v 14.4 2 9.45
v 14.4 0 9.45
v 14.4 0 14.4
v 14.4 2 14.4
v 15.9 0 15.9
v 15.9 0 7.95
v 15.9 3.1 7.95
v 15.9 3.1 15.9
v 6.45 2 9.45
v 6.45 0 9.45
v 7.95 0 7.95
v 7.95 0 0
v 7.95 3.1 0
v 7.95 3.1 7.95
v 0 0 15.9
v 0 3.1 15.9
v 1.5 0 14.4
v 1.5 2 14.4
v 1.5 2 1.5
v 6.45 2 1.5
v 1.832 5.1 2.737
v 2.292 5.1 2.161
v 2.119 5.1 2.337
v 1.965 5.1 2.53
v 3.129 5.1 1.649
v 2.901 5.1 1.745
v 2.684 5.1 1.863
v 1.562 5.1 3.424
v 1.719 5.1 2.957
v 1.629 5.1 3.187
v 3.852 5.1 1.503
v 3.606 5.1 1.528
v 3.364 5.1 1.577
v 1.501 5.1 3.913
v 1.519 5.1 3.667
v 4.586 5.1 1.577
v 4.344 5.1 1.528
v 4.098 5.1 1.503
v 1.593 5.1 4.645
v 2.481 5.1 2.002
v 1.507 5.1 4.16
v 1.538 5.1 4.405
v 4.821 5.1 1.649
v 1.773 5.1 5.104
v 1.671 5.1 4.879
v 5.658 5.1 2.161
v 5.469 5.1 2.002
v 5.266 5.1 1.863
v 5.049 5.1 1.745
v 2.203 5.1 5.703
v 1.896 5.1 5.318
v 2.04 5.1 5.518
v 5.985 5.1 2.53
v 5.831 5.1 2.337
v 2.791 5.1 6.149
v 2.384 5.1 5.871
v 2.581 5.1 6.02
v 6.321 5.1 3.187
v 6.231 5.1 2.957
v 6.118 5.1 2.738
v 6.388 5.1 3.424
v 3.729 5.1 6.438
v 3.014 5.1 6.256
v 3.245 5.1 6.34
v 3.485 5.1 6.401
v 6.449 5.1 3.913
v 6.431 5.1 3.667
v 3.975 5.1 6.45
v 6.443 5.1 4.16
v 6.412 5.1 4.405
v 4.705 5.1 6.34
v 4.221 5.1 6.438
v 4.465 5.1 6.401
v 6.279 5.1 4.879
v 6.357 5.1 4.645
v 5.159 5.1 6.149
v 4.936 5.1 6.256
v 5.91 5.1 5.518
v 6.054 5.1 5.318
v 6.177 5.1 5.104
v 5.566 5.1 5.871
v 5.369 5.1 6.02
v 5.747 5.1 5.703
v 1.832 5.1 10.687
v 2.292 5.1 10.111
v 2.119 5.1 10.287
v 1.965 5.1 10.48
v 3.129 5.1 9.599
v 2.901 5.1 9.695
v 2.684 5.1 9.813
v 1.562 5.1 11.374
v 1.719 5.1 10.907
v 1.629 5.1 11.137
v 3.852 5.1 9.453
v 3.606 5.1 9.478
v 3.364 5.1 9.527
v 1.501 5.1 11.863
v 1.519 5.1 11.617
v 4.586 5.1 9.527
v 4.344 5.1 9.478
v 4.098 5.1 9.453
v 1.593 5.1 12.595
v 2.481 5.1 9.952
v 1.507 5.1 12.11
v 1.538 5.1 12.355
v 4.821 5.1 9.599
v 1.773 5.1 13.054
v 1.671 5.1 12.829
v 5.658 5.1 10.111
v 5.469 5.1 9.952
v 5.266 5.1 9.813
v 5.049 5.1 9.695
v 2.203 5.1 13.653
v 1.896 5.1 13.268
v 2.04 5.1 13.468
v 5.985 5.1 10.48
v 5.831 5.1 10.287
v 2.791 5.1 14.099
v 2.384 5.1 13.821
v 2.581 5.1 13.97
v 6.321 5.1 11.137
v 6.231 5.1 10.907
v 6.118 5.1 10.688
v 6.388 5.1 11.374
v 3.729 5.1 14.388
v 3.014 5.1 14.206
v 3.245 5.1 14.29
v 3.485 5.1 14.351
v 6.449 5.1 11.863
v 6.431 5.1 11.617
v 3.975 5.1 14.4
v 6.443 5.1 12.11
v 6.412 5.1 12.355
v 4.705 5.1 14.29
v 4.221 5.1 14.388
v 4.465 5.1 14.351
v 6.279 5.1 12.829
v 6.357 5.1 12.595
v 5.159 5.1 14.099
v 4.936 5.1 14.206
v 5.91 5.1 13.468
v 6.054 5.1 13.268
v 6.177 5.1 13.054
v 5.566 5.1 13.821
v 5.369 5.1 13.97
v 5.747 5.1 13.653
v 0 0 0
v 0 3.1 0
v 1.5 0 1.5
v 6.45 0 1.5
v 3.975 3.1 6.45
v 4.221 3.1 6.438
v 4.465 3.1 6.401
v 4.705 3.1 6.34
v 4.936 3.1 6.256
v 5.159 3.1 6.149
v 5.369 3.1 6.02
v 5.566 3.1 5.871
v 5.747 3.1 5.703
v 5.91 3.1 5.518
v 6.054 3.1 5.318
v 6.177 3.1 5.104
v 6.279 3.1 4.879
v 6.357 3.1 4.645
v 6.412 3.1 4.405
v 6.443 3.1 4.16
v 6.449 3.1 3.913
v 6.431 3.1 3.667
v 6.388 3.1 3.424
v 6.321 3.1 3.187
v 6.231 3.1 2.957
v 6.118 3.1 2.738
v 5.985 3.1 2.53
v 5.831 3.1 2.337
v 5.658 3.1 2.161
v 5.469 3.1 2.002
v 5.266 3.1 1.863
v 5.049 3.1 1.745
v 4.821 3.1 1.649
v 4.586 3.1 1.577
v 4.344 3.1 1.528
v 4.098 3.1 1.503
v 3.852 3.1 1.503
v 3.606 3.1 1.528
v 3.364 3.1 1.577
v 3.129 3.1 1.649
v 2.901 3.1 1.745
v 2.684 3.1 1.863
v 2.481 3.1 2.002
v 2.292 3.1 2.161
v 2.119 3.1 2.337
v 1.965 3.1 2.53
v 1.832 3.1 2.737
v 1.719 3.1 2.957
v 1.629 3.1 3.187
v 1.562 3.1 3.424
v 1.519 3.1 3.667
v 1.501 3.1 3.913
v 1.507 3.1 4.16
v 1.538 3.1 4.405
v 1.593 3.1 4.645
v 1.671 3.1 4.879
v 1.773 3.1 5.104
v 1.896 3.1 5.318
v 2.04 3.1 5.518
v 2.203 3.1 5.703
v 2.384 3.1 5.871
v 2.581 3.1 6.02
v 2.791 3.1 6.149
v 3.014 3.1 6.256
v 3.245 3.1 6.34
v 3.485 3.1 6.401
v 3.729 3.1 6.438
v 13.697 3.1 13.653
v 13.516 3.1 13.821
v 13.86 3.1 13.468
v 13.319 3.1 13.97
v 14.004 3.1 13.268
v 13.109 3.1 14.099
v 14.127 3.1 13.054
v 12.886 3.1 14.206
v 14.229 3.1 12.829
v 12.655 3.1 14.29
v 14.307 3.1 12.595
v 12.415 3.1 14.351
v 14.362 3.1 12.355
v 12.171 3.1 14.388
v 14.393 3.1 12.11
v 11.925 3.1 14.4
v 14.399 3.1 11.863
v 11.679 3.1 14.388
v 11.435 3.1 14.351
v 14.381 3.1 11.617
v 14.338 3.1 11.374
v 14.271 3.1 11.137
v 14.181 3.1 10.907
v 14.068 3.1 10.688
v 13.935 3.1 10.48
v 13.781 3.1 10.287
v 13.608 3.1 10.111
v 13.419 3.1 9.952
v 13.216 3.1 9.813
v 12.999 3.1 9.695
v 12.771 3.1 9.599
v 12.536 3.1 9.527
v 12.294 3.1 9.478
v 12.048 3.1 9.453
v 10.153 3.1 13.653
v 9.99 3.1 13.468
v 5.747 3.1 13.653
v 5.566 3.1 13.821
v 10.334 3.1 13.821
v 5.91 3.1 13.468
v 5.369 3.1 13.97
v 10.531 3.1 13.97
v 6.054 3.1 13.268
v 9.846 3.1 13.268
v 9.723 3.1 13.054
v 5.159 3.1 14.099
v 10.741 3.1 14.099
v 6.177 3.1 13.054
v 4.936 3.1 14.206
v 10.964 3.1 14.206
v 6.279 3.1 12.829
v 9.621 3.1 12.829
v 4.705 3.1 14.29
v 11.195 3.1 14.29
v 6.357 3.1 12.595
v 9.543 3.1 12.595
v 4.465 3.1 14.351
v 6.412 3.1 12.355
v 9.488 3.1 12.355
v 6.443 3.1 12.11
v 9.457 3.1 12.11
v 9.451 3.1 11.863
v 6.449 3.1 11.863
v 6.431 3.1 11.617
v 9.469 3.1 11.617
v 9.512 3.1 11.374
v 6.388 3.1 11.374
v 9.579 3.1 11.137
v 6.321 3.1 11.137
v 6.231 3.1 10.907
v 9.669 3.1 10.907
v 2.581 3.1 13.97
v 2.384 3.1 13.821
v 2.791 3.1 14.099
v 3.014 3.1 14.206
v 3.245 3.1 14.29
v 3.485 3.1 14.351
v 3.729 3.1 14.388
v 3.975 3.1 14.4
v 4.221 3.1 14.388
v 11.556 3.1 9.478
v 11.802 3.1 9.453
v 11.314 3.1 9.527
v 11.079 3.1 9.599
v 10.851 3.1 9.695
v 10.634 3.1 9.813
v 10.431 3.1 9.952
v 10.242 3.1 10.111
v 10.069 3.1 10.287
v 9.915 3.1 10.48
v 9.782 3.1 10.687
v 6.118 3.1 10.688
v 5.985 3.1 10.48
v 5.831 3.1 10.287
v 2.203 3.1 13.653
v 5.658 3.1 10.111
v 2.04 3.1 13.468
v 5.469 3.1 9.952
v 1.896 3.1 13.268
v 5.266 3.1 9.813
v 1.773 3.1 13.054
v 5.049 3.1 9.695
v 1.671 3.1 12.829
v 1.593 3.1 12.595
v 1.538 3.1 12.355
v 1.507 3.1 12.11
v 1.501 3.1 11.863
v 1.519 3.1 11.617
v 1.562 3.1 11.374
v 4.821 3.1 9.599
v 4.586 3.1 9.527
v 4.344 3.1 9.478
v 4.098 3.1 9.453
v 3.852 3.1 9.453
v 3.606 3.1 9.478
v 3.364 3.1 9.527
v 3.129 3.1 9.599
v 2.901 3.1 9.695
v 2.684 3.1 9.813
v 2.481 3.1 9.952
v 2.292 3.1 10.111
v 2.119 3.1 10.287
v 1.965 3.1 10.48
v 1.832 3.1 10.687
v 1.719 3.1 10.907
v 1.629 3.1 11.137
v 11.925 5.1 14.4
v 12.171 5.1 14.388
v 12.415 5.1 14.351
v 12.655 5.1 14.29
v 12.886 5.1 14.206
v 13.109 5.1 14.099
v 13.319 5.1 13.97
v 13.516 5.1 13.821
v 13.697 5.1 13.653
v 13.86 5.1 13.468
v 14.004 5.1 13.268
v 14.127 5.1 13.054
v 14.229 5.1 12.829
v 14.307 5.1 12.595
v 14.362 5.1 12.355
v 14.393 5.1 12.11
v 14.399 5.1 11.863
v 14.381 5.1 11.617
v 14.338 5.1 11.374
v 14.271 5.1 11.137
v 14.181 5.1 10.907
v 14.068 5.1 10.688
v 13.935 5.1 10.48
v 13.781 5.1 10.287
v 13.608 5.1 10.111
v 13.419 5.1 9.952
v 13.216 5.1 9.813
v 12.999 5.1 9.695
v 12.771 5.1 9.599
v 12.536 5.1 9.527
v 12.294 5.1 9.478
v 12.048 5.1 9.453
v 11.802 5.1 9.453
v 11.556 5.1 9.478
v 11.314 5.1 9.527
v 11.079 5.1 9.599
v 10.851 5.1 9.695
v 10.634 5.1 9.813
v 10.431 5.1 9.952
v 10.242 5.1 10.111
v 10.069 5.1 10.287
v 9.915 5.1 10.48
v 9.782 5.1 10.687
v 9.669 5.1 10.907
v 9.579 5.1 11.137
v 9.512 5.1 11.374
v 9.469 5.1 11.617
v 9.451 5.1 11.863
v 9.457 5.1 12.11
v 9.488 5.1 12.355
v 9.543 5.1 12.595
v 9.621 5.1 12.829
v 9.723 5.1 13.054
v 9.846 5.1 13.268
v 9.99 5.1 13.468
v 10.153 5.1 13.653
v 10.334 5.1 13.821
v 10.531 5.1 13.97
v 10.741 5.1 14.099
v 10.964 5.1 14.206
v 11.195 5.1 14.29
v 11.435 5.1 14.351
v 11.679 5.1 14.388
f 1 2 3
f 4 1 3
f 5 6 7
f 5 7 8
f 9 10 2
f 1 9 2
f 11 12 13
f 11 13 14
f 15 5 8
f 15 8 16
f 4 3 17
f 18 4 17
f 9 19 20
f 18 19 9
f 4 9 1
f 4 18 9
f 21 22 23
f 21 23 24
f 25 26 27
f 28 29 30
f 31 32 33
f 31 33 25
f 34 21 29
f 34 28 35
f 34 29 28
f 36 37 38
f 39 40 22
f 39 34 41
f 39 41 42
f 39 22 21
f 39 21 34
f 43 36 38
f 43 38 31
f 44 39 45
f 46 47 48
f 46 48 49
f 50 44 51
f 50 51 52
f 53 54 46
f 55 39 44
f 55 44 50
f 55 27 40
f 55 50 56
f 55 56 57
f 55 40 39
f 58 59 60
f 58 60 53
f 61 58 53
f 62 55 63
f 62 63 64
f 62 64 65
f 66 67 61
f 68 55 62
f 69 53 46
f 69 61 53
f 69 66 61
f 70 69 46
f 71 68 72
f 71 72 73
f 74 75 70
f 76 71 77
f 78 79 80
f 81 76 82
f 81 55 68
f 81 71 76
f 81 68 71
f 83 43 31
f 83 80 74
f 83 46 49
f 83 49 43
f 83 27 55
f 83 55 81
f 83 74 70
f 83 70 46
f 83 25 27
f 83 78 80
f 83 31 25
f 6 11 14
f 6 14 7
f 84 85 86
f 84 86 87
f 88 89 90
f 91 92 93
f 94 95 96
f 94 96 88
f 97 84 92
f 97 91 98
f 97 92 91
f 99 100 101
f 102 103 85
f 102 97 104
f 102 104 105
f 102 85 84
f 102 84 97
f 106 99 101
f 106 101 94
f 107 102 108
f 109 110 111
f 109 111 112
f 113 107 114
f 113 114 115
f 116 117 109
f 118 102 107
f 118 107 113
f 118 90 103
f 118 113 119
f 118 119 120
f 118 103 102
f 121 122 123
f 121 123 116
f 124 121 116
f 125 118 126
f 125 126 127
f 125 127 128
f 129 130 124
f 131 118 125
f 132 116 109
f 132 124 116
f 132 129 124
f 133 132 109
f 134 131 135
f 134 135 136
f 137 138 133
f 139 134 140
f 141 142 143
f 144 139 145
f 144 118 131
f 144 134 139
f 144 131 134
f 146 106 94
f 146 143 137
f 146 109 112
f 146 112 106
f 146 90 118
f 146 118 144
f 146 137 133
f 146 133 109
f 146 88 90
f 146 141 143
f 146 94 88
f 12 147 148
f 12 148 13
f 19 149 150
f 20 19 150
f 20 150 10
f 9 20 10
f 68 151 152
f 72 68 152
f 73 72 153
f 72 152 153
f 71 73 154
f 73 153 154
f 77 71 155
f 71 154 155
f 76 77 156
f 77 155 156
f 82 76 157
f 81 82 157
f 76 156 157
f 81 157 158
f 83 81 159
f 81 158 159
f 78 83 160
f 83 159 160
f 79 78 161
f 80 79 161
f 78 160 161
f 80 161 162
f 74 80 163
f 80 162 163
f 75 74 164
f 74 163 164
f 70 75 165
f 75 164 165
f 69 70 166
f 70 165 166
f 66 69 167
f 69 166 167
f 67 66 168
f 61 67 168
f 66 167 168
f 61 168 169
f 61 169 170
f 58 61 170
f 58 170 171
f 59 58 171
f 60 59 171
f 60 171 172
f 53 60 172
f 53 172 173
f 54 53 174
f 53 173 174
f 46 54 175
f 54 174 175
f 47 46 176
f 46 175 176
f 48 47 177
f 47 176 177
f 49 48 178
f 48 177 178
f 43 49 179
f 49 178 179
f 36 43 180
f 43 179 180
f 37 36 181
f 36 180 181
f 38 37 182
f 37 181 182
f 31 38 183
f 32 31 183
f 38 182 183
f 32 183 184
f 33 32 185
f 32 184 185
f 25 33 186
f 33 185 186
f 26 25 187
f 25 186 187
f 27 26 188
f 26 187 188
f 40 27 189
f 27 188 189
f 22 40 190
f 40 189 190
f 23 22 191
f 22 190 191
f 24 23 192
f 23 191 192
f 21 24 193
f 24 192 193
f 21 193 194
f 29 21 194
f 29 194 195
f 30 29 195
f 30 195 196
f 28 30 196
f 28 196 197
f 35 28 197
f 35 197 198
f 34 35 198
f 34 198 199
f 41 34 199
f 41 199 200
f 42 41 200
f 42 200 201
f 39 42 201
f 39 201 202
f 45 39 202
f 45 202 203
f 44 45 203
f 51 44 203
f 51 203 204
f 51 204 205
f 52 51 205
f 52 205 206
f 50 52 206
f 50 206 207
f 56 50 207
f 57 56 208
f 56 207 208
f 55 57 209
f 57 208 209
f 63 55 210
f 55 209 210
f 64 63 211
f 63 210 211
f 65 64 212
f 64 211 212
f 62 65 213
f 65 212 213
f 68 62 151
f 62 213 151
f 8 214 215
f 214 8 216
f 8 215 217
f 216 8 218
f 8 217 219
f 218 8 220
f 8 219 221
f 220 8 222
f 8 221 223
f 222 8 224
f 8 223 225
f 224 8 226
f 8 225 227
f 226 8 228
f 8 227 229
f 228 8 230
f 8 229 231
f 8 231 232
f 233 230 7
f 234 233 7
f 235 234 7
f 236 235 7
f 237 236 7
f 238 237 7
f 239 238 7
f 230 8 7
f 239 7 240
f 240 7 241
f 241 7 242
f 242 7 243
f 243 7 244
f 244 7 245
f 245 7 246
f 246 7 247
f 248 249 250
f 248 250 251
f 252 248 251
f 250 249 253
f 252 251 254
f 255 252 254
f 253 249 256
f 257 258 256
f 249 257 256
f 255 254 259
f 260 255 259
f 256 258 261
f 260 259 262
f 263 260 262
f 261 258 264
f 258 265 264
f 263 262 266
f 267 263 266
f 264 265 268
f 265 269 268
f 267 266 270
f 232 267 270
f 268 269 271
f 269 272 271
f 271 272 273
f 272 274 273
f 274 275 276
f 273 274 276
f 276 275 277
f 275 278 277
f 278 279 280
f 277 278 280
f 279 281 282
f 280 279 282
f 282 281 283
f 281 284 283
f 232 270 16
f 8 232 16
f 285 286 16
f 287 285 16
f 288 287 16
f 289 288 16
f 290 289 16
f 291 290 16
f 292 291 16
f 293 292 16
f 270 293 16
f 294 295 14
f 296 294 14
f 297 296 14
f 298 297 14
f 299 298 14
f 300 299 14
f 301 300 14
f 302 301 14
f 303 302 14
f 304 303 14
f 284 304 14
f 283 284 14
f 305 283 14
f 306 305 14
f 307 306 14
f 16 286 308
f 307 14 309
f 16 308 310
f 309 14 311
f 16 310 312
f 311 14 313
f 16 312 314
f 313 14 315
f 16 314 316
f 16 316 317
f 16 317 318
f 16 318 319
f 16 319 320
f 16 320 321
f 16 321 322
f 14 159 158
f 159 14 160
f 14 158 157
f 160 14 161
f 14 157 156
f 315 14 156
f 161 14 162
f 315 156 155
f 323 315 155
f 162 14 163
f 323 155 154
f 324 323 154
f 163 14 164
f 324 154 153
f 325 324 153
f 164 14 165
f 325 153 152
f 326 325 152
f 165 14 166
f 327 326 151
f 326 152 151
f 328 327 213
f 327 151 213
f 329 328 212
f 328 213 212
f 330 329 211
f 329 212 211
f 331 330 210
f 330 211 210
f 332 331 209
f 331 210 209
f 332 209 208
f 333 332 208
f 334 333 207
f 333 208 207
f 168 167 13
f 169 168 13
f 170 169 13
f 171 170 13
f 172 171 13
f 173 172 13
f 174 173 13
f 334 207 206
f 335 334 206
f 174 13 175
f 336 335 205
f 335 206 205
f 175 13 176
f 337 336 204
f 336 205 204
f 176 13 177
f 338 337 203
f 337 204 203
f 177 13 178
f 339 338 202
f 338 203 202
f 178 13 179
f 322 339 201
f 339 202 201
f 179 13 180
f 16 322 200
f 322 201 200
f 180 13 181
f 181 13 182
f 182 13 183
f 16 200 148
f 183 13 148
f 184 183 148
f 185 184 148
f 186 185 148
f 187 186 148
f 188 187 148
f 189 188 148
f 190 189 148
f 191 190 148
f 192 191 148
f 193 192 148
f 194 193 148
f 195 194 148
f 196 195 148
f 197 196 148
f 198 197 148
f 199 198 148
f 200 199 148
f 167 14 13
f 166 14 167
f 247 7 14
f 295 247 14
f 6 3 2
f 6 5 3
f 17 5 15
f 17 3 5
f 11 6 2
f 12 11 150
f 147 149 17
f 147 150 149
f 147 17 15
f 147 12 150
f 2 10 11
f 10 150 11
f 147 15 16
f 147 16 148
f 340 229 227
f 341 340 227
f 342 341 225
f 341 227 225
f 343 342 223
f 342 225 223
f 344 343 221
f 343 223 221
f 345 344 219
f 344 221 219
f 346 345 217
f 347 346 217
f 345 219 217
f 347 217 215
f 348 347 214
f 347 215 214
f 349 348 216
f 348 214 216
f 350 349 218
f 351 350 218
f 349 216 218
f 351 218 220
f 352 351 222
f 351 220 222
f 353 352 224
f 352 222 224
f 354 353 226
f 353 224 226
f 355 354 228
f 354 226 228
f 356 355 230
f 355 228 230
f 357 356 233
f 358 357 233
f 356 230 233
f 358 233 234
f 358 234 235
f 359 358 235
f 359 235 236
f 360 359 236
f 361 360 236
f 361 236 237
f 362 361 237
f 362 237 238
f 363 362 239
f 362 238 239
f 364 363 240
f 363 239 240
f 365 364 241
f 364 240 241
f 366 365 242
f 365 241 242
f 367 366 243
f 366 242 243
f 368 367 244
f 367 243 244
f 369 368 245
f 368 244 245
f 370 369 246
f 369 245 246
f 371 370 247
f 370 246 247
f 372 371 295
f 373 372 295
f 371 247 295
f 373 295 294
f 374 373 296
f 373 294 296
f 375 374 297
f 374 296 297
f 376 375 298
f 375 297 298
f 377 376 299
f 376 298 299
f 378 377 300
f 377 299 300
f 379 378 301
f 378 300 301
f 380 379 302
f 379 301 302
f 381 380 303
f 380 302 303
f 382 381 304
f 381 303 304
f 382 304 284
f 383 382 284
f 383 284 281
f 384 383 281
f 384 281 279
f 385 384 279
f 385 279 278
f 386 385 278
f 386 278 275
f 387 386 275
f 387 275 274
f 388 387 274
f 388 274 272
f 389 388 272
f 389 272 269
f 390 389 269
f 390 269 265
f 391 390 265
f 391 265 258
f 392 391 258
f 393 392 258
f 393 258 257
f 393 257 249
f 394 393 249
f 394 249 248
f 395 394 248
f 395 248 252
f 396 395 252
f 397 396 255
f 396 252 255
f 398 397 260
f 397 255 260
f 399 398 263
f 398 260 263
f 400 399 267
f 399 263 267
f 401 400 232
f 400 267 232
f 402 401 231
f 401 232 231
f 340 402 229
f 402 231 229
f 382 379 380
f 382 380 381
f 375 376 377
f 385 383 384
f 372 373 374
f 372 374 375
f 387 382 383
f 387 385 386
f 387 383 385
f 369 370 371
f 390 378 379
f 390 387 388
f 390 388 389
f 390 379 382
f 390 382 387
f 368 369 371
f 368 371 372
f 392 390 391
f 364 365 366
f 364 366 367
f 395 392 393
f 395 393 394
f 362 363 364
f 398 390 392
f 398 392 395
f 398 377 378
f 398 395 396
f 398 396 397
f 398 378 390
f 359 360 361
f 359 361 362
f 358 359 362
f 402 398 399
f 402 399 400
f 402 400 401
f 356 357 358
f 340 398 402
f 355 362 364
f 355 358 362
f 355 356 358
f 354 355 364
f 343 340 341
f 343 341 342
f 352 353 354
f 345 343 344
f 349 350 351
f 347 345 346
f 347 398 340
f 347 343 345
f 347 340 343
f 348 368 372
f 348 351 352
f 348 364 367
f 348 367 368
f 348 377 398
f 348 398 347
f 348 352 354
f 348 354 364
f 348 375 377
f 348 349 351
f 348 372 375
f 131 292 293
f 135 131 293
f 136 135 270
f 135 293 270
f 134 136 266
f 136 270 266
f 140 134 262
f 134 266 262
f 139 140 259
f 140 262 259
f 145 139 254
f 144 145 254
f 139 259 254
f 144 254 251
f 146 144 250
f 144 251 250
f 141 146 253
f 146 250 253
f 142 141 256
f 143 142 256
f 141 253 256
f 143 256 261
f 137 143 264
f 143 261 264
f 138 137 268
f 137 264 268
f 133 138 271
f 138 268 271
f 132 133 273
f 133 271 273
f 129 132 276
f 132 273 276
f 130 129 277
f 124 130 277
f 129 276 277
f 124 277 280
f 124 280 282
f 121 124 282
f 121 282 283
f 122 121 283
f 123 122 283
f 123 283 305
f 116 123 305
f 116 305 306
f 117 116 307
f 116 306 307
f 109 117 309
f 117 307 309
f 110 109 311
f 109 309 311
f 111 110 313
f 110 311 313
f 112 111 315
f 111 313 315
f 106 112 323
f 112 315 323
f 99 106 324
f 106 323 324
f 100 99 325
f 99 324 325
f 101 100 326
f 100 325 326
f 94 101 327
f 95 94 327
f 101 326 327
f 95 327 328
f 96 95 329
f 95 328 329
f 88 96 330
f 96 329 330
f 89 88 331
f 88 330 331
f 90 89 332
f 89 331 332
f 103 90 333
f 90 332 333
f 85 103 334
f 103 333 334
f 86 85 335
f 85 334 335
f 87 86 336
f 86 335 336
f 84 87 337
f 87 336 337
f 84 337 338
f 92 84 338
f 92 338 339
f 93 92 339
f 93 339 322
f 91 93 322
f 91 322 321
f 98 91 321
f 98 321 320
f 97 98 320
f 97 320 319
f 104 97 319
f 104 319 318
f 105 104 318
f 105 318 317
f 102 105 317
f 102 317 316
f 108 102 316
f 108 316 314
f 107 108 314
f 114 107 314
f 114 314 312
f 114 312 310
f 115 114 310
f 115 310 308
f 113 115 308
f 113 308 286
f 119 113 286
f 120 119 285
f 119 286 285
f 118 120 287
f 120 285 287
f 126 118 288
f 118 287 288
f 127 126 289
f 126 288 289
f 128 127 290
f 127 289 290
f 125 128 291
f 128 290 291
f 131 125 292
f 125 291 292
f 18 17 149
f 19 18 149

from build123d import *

# Parameters (mm, degrees)
BOSS_EXTRUDE1_DEPTH = 3.1
SKETCH2_R           = 2.475
BOSS_EXTRUDE2_DEPTH = 2
CUT_EXTRUDE1_DEPTH  = 2


with BuildPart() as part:
    # Sketch1 → Boss-Extrude1 (new body)
    with BuildSketch(Plane(origin=(0, 0, 0), x_dir=(1, 0, 0), z_dir=(0, 1, 0))):
        Polygon((0, 0), (7.95, 0), (7.95, -7.95), (15.9, -7.95), (15.9, -15.9), (0, -15.9), align=None)
    extrude(amount=BOSS_EXTRUDE1_DEPTH)

    # Sketch2 → Boss-Extrude2 (add)
    with BuildSketch(Plane(origin=(0, 3.1, 0), x_dir=(1, 0, 0), z_dir=(0, 1, 0))):
        with Locations(Location((3.975, -3.975, 0), (0, 0, 270))):
            Circle(SKETCH2_R)
        with Locations(Location((3.975, -11.925, 0), (0, 0, 270))):
            Circle(SKETCH2_R)
        with Locations(Location((11.925, -11.925, 0), (0, 0, 270))):
            Circle(SKETCH2_R)
    extrude(amount=BOSS_EXTRUDE2_DEPTH)

    # Sketch3 → Cut-Extrude1 (cut)
    with BuildSketch(Plane.XZ):
        Polygon((1.5, 14.4), (1.5, 1.5), (6.45, 1.5), (6.45, 9.45), (14.4, 9.45), (14.4, 14.4), align=None)
    extrude(amount=-CUT_EXTRUDE1_DEPTH, mode=Mode.SUBTRACT)


solid = part.part
